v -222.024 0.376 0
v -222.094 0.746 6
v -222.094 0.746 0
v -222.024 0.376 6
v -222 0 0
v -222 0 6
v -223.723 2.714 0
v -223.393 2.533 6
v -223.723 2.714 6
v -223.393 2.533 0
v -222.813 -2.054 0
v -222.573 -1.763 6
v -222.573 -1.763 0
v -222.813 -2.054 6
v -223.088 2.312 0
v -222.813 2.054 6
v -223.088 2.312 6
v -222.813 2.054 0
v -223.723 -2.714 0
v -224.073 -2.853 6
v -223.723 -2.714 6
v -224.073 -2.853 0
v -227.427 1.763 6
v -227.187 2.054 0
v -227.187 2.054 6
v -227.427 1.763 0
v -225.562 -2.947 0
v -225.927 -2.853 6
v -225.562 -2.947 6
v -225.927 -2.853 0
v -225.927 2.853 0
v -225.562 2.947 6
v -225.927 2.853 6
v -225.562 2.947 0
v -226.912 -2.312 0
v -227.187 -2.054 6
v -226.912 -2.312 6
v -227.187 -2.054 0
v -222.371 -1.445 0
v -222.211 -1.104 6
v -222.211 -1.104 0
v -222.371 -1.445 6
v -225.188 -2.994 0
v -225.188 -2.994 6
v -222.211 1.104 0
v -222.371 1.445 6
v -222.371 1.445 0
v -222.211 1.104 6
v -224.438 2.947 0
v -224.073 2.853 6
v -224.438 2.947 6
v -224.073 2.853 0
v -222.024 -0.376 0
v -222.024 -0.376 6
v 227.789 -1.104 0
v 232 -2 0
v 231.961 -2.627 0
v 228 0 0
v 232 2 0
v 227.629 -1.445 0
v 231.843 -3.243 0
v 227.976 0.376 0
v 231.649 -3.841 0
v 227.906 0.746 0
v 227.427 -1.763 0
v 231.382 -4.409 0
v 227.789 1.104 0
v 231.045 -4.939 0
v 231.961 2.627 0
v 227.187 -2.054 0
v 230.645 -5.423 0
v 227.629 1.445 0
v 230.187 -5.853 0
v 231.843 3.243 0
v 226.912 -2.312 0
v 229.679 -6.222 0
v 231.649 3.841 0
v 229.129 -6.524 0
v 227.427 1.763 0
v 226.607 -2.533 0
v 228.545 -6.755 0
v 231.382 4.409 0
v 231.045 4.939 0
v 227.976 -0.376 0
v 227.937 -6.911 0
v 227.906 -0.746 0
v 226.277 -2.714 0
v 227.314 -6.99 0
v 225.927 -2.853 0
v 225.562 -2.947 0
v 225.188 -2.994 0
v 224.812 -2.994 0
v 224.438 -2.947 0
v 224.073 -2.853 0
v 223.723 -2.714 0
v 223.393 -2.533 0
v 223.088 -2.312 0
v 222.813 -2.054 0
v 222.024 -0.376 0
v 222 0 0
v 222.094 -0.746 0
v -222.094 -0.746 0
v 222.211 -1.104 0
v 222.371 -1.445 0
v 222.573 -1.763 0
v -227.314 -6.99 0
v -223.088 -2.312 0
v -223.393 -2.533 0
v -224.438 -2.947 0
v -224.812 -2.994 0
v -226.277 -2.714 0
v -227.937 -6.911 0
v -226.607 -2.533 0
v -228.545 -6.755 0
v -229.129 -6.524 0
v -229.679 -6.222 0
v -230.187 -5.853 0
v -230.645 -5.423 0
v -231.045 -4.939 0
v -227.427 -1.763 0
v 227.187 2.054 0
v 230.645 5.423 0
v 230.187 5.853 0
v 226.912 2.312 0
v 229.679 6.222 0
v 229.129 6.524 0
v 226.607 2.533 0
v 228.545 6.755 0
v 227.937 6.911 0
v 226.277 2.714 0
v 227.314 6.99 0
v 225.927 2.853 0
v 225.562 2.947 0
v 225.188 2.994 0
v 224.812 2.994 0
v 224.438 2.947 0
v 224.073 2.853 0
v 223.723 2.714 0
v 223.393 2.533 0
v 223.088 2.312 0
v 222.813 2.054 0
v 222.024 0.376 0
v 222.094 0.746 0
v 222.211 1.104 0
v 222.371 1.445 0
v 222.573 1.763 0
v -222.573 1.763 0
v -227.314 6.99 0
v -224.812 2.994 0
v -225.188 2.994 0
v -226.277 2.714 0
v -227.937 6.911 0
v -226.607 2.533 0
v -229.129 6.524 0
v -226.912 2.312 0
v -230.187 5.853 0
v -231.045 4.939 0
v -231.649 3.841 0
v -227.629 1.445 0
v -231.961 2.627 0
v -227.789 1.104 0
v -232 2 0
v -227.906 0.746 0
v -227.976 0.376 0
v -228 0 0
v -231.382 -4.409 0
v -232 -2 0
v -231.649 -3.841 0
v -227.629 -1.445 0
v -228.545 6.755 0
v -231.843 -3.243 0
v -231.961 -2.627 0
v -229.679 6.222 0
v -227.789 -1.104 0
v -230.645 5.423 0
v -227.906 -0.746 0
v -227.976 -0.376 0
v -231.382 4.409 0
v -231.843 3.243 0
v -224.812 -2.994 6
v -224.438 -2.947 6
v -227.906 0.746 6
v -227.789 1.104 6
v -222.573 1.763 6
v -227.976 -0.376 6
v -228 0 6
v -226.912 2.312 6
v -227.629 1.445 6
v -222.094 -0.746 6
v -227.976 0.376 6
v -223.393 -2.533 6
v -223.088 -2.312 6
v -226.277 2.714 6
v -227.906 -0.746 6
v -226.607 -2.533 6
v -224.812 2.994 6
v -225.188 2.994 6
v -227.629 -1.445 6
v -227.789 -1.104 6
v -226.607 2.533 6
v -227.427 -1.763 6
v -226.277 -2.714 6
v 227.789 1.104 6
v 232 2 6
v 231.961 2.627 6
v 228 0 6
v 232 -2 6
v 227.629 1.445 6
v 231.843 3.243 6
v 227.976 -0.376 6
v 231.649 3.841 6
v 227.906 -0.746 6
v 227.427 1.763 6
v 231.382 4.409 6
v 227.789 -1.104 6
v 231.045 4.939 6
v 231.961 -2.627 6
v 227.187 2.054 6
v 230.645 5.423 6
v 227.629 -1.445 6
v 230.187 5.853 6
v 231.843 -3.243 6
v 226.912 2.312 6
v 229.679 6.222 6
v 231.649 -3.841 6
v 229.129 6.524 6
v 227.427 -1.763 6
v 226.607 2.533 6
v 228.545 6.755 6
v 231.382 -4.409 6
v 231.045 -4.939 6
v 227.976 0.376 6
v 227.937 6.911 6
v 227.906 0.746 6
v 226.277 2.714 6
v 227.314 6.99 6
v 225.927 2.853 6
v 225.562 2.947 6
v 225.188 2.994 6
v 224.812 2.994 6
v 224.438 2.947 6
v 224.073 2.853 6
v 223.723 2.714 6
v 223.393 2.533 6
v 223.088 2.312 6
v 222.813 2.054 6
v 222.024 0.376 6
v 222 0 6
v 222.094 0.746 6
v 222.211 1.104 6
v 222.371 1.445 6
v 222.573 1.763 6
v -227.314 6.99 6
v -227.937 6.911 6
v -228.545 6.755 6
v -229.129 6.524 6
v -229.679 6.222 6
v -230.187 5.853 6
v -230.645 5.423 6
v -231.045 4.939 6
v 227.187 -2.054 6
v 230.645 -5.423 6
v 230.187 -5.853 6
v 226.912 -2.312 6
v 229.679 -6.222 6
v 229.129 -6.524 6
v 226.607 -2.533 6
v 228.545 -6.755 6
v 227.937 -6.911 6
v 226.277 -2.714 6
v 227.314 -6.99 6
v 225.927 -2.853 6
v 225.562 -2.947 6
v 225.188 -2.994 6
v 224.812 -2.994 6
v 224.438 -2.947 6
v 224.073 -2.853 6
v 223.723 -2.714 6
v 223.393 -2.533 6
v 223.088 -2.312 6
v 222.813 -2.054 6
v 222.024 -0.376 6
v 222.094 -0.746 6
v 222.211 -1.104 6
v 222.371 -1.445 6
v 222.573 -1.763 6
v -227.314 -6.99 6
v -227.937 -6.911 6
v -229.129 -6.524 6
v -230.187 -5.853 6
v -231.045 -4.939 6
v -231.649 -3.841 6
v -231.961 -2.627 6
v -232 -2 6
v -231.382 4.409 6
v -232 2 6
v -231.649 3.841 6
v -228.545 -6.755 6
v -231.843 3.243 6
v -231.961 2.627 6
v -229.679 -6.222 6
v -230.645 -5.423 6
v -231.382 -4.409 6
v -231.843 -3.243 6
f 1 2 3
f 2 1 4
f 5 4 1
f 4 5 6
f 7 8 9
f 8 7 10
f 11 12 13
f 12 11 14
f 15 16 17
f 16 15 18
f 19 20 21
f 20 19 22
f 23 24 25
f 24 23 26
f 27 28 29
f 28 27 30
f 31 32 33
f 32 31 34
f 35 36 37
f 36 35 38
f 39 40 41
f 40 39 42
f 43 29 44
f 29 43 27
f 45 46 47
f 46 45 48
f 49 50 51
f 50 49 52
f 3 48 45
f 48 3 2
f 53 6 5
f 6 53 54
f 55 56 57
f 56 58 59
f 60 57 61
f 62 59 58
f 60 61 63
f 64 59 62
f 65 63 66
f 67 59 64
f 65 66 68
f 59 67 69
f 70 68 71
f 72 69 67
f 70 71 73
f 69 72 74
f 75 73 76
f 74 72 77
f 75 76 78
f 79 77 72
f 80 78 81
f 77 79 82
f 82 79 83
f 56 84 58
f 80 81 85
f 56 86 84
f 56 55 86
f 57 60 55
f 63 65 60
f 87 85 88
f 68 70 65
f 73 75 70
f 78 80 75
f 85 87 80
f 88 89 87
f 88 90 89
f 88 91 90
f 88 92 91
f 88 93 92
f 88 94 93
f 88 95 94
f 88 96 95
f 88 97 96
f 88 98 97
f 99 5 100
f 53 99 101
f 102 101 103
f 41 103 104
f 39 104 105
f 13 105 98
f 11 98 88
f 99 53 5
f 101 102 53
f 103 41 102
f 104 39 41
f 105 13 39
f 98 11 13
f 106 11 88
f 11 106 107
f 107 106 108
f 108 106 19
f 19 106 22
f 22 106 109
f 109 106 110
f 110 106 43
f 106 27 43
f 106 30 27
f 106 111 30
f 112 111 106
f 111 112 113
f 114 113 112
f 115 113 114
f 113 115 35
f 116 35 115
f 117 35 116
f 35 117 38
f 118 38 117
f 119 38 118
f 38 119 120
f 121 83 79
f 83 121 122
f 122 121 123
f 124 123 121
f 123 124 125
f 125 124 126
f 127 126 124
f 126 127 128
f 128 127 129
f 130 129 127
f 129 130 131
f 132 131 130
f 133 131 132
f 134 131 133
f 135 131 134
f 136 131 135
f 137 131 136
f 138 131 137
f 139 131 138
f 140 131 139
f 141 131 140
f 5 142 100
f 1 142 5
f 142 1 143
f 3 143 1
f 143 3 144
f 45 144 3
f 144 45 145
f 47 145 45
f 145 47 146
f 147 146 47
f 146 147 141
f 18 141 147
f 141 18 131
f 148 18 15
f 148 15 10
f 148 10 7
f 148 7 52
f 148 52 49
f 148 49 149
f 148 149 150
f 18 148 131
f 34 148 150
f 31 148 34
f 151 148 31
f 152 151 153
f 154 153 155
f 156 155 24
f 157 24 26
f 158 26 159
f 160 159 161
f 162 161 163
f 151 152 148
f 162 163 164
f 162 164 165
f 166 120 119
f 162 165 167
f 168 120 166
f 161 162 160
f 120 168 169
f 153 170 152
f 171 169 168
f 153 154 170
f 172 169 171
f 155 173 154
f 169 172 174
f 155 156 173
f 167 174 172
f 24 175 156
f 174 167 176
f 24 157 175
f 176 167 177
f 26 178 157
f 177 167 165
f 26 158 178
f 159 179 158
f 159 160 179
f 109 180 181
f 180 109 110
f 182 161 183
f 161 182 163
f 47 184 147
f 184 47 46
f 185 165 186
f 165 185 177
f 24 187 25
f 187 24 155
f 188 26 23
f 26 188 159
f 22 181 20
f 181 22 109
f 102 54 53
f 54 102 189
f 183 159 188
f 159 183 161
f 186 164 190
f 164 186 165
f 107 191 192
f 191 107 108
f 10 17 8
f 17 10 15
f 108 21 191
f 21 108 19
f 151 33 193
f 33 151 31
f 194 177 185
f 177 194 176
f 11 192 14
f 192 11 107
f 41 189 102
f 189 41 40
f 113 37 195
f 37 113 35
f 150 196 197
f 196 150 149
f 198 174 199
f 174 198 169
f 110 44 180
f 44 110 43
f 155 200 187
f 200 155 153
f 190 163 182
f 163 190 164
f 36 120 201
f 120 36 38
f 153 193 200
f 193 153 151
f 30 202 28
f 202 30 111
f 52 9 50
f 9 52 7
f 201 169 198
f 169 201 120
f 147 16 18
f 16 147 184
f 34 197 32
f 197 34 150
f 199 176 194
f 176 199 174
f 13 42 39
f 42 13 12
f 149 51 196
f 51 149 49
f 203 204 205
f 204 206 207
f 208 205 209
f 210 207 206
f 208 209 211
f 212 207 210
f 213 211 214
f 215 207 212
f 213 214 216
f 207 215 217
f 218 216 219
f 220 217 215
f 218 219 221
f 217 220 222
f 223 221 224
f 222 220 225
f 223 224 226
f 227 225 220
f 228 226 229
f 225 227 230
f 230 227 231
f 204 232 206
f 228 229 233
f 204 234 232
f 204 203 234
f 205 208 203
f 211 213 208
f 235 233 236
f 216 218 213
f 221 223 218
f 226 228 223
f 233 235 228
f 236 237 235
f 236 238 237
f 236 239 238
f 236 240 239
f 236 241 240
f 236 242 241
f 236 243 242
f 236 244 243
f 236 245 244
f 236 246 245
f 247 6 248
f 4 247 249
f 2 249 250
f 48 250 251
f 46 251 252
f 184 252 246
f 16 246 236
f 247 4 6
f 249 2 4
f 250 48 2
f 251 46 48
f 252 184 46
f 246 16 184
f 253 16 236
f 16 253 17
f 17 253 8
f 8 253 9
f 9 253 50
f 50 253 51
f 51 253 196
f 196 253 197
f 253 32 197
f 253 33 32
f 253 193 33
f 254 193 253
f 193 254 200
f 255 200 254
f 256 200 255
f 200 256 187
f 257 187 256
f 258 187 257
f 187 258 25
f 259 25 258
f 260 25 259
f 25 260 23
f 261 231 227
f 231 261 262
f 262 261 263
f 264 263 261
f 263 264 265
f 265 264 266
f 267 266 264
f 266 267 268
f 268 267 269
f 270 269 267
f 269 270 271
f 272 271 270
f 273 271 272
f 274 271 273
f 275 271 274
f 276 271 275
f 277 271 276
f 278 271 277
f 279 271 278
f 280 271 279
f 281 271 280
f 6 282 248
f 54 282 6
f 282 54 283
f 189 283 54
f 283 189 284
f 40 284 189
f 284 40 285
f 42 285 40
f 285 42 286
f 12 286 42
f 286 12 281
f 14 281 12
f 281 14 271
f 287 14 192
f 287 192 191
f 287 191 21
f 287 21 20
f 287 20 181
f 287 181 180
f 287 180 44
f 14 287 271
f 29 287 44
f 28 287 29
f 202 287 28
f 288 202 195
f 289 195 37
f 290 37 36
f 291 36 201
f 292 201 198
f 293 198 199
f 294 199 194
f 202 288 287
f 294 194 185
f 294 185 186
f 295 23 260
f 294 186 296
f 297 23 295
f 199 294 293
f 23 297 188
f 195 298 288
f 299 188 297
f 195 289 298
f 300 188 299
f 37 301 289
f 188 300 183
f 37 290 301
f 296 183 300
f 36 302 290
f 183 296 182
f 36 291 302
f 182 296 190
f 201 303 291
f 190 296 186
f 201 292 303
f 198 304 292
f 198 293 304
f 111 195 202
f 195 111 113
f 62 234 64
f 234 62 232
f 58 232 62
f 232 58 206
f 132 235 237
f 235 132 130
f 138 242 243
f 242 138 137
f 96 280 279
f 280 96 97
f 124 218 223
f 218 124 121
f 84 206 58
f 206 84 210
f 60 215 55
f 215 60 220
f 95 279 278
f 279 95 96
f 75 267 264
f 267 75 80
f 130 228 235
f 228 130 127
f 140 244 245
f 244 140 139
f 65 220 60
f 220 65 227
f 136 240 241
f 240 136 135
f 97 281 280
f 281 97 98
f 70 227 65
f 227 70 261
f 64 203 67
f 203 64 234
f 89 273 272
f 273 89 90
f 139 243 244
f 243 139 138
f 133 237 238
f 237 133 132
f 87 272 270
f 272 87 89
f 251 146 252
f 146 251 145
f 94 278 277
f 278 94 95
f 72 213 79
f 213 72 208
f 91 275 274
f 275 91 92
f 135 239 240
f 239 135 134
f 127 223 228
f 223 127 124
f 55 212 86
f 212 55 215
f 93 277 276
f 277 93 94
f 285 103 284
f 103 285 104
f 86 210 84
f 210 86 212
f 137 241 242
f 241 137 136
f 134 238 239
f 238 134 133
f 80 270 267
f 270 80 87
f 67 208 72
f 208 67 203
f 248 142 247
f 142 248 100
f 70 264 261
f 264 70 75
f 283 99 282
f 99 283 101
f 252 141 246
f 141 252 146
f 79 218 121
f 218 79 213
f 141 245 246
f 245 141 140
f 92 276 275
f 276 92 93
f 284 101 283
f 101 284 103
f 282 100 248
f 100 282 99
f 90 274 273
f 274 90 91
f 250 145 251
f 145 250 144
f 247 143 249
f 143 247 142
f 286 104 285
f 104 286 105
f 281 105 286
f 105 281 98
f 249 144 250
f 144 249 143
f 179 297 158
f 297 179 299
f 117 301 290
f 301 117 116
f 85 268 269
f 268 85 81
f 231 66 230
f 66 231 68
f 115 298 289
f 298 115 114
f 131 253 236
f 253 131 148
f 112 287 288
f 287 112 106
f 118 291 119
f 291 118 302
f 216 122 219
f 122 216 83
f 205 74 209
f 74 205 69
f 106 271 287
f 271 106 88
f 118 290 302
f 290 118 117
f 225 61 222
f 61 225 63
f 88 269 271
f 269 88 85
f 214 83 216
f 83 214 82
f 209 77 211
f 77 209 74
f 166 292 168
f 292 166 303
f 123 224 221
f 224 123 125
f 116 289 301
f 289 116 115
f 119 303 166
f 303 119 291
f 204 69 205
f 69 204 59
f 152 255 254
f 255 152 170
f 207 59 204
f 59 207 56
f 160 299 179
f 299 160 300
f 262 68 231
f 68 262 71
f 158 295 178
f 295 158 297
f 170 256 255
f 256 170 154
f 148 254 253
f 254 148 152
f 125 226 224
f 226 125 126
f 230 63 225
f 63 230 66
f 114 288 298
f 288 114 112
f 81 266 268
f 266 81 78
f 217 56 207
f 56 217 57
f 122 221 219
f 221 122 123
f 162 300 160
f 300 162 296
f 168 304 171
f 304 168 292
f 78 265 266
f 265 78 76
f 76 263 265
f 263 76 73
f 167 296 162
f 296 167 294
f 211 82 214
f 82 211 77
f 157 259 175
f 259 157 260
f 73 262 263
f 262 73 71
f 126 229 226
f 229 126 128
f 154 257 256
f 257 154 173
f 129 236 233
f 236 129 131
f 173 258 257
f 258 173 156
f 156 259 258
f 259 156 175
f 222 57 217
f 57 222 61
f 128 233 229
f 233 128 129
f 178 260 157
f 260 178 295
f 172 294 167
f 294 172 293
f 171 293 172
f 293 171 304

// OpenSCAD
$fn = 50;


difference() {
	union() {
		hull() {
			translate(v = [-227.0000000000, 2.0000000000, 0]) {
				cylinder(h = 6, r = 5);
			}
			translate(v = [227.0000000000, 2.0000000000, 0]) {
				cylinder(h = 6, r = 5);
			}
			translate(v = [-227.0000000000, -2.0000000000, 0]) {
				cylinder(h = 6, r = 5);
			}
			translate(v = [227.0000000000, -2.0000000000, 0]) {
				cylinder(h = 6, r = 5);
			}
		}
	}
	union() {
		translate(v = [-225.0000000000, 0.0000000000, 0]) {
			cylinder(h = 6, r = 3.0000000000);
		}
		translate(v = [225.0000000000, 0.0000000000, 0]) {
			cylinder(h = 6, r = 3.0000000000);
		}
		translate(v = [-225.0000000000, 0.0000000000, 0]) {
			cylinder(h = 6, r = 1.5000000000);
		}
		translate(v = [225.0000000000, 0.0000000000, 0]) {
			cylinder(h = 6, r = 1.5000000000);
		}
		translate(v = [-225.0000000000, 0.0000000000, 0]) {
			cylinder(h = 6, r = 1.5000000000);
		}
		translate(v = [225.0000000000, 0.0000000000, 0]) {
			cylinder(h = 6, r = 1.5000000000);
		}
		translate(v = [-225.0000000000, 0.0000000000, 0]) {
			cylinder(h = 6, r = 1.5000000000);
		}
		translate(v = [225.0000000000, 0.0000000000, 0]) {
			cylinder(h = 6, r = 1.5000000000);
		}
	}
}
